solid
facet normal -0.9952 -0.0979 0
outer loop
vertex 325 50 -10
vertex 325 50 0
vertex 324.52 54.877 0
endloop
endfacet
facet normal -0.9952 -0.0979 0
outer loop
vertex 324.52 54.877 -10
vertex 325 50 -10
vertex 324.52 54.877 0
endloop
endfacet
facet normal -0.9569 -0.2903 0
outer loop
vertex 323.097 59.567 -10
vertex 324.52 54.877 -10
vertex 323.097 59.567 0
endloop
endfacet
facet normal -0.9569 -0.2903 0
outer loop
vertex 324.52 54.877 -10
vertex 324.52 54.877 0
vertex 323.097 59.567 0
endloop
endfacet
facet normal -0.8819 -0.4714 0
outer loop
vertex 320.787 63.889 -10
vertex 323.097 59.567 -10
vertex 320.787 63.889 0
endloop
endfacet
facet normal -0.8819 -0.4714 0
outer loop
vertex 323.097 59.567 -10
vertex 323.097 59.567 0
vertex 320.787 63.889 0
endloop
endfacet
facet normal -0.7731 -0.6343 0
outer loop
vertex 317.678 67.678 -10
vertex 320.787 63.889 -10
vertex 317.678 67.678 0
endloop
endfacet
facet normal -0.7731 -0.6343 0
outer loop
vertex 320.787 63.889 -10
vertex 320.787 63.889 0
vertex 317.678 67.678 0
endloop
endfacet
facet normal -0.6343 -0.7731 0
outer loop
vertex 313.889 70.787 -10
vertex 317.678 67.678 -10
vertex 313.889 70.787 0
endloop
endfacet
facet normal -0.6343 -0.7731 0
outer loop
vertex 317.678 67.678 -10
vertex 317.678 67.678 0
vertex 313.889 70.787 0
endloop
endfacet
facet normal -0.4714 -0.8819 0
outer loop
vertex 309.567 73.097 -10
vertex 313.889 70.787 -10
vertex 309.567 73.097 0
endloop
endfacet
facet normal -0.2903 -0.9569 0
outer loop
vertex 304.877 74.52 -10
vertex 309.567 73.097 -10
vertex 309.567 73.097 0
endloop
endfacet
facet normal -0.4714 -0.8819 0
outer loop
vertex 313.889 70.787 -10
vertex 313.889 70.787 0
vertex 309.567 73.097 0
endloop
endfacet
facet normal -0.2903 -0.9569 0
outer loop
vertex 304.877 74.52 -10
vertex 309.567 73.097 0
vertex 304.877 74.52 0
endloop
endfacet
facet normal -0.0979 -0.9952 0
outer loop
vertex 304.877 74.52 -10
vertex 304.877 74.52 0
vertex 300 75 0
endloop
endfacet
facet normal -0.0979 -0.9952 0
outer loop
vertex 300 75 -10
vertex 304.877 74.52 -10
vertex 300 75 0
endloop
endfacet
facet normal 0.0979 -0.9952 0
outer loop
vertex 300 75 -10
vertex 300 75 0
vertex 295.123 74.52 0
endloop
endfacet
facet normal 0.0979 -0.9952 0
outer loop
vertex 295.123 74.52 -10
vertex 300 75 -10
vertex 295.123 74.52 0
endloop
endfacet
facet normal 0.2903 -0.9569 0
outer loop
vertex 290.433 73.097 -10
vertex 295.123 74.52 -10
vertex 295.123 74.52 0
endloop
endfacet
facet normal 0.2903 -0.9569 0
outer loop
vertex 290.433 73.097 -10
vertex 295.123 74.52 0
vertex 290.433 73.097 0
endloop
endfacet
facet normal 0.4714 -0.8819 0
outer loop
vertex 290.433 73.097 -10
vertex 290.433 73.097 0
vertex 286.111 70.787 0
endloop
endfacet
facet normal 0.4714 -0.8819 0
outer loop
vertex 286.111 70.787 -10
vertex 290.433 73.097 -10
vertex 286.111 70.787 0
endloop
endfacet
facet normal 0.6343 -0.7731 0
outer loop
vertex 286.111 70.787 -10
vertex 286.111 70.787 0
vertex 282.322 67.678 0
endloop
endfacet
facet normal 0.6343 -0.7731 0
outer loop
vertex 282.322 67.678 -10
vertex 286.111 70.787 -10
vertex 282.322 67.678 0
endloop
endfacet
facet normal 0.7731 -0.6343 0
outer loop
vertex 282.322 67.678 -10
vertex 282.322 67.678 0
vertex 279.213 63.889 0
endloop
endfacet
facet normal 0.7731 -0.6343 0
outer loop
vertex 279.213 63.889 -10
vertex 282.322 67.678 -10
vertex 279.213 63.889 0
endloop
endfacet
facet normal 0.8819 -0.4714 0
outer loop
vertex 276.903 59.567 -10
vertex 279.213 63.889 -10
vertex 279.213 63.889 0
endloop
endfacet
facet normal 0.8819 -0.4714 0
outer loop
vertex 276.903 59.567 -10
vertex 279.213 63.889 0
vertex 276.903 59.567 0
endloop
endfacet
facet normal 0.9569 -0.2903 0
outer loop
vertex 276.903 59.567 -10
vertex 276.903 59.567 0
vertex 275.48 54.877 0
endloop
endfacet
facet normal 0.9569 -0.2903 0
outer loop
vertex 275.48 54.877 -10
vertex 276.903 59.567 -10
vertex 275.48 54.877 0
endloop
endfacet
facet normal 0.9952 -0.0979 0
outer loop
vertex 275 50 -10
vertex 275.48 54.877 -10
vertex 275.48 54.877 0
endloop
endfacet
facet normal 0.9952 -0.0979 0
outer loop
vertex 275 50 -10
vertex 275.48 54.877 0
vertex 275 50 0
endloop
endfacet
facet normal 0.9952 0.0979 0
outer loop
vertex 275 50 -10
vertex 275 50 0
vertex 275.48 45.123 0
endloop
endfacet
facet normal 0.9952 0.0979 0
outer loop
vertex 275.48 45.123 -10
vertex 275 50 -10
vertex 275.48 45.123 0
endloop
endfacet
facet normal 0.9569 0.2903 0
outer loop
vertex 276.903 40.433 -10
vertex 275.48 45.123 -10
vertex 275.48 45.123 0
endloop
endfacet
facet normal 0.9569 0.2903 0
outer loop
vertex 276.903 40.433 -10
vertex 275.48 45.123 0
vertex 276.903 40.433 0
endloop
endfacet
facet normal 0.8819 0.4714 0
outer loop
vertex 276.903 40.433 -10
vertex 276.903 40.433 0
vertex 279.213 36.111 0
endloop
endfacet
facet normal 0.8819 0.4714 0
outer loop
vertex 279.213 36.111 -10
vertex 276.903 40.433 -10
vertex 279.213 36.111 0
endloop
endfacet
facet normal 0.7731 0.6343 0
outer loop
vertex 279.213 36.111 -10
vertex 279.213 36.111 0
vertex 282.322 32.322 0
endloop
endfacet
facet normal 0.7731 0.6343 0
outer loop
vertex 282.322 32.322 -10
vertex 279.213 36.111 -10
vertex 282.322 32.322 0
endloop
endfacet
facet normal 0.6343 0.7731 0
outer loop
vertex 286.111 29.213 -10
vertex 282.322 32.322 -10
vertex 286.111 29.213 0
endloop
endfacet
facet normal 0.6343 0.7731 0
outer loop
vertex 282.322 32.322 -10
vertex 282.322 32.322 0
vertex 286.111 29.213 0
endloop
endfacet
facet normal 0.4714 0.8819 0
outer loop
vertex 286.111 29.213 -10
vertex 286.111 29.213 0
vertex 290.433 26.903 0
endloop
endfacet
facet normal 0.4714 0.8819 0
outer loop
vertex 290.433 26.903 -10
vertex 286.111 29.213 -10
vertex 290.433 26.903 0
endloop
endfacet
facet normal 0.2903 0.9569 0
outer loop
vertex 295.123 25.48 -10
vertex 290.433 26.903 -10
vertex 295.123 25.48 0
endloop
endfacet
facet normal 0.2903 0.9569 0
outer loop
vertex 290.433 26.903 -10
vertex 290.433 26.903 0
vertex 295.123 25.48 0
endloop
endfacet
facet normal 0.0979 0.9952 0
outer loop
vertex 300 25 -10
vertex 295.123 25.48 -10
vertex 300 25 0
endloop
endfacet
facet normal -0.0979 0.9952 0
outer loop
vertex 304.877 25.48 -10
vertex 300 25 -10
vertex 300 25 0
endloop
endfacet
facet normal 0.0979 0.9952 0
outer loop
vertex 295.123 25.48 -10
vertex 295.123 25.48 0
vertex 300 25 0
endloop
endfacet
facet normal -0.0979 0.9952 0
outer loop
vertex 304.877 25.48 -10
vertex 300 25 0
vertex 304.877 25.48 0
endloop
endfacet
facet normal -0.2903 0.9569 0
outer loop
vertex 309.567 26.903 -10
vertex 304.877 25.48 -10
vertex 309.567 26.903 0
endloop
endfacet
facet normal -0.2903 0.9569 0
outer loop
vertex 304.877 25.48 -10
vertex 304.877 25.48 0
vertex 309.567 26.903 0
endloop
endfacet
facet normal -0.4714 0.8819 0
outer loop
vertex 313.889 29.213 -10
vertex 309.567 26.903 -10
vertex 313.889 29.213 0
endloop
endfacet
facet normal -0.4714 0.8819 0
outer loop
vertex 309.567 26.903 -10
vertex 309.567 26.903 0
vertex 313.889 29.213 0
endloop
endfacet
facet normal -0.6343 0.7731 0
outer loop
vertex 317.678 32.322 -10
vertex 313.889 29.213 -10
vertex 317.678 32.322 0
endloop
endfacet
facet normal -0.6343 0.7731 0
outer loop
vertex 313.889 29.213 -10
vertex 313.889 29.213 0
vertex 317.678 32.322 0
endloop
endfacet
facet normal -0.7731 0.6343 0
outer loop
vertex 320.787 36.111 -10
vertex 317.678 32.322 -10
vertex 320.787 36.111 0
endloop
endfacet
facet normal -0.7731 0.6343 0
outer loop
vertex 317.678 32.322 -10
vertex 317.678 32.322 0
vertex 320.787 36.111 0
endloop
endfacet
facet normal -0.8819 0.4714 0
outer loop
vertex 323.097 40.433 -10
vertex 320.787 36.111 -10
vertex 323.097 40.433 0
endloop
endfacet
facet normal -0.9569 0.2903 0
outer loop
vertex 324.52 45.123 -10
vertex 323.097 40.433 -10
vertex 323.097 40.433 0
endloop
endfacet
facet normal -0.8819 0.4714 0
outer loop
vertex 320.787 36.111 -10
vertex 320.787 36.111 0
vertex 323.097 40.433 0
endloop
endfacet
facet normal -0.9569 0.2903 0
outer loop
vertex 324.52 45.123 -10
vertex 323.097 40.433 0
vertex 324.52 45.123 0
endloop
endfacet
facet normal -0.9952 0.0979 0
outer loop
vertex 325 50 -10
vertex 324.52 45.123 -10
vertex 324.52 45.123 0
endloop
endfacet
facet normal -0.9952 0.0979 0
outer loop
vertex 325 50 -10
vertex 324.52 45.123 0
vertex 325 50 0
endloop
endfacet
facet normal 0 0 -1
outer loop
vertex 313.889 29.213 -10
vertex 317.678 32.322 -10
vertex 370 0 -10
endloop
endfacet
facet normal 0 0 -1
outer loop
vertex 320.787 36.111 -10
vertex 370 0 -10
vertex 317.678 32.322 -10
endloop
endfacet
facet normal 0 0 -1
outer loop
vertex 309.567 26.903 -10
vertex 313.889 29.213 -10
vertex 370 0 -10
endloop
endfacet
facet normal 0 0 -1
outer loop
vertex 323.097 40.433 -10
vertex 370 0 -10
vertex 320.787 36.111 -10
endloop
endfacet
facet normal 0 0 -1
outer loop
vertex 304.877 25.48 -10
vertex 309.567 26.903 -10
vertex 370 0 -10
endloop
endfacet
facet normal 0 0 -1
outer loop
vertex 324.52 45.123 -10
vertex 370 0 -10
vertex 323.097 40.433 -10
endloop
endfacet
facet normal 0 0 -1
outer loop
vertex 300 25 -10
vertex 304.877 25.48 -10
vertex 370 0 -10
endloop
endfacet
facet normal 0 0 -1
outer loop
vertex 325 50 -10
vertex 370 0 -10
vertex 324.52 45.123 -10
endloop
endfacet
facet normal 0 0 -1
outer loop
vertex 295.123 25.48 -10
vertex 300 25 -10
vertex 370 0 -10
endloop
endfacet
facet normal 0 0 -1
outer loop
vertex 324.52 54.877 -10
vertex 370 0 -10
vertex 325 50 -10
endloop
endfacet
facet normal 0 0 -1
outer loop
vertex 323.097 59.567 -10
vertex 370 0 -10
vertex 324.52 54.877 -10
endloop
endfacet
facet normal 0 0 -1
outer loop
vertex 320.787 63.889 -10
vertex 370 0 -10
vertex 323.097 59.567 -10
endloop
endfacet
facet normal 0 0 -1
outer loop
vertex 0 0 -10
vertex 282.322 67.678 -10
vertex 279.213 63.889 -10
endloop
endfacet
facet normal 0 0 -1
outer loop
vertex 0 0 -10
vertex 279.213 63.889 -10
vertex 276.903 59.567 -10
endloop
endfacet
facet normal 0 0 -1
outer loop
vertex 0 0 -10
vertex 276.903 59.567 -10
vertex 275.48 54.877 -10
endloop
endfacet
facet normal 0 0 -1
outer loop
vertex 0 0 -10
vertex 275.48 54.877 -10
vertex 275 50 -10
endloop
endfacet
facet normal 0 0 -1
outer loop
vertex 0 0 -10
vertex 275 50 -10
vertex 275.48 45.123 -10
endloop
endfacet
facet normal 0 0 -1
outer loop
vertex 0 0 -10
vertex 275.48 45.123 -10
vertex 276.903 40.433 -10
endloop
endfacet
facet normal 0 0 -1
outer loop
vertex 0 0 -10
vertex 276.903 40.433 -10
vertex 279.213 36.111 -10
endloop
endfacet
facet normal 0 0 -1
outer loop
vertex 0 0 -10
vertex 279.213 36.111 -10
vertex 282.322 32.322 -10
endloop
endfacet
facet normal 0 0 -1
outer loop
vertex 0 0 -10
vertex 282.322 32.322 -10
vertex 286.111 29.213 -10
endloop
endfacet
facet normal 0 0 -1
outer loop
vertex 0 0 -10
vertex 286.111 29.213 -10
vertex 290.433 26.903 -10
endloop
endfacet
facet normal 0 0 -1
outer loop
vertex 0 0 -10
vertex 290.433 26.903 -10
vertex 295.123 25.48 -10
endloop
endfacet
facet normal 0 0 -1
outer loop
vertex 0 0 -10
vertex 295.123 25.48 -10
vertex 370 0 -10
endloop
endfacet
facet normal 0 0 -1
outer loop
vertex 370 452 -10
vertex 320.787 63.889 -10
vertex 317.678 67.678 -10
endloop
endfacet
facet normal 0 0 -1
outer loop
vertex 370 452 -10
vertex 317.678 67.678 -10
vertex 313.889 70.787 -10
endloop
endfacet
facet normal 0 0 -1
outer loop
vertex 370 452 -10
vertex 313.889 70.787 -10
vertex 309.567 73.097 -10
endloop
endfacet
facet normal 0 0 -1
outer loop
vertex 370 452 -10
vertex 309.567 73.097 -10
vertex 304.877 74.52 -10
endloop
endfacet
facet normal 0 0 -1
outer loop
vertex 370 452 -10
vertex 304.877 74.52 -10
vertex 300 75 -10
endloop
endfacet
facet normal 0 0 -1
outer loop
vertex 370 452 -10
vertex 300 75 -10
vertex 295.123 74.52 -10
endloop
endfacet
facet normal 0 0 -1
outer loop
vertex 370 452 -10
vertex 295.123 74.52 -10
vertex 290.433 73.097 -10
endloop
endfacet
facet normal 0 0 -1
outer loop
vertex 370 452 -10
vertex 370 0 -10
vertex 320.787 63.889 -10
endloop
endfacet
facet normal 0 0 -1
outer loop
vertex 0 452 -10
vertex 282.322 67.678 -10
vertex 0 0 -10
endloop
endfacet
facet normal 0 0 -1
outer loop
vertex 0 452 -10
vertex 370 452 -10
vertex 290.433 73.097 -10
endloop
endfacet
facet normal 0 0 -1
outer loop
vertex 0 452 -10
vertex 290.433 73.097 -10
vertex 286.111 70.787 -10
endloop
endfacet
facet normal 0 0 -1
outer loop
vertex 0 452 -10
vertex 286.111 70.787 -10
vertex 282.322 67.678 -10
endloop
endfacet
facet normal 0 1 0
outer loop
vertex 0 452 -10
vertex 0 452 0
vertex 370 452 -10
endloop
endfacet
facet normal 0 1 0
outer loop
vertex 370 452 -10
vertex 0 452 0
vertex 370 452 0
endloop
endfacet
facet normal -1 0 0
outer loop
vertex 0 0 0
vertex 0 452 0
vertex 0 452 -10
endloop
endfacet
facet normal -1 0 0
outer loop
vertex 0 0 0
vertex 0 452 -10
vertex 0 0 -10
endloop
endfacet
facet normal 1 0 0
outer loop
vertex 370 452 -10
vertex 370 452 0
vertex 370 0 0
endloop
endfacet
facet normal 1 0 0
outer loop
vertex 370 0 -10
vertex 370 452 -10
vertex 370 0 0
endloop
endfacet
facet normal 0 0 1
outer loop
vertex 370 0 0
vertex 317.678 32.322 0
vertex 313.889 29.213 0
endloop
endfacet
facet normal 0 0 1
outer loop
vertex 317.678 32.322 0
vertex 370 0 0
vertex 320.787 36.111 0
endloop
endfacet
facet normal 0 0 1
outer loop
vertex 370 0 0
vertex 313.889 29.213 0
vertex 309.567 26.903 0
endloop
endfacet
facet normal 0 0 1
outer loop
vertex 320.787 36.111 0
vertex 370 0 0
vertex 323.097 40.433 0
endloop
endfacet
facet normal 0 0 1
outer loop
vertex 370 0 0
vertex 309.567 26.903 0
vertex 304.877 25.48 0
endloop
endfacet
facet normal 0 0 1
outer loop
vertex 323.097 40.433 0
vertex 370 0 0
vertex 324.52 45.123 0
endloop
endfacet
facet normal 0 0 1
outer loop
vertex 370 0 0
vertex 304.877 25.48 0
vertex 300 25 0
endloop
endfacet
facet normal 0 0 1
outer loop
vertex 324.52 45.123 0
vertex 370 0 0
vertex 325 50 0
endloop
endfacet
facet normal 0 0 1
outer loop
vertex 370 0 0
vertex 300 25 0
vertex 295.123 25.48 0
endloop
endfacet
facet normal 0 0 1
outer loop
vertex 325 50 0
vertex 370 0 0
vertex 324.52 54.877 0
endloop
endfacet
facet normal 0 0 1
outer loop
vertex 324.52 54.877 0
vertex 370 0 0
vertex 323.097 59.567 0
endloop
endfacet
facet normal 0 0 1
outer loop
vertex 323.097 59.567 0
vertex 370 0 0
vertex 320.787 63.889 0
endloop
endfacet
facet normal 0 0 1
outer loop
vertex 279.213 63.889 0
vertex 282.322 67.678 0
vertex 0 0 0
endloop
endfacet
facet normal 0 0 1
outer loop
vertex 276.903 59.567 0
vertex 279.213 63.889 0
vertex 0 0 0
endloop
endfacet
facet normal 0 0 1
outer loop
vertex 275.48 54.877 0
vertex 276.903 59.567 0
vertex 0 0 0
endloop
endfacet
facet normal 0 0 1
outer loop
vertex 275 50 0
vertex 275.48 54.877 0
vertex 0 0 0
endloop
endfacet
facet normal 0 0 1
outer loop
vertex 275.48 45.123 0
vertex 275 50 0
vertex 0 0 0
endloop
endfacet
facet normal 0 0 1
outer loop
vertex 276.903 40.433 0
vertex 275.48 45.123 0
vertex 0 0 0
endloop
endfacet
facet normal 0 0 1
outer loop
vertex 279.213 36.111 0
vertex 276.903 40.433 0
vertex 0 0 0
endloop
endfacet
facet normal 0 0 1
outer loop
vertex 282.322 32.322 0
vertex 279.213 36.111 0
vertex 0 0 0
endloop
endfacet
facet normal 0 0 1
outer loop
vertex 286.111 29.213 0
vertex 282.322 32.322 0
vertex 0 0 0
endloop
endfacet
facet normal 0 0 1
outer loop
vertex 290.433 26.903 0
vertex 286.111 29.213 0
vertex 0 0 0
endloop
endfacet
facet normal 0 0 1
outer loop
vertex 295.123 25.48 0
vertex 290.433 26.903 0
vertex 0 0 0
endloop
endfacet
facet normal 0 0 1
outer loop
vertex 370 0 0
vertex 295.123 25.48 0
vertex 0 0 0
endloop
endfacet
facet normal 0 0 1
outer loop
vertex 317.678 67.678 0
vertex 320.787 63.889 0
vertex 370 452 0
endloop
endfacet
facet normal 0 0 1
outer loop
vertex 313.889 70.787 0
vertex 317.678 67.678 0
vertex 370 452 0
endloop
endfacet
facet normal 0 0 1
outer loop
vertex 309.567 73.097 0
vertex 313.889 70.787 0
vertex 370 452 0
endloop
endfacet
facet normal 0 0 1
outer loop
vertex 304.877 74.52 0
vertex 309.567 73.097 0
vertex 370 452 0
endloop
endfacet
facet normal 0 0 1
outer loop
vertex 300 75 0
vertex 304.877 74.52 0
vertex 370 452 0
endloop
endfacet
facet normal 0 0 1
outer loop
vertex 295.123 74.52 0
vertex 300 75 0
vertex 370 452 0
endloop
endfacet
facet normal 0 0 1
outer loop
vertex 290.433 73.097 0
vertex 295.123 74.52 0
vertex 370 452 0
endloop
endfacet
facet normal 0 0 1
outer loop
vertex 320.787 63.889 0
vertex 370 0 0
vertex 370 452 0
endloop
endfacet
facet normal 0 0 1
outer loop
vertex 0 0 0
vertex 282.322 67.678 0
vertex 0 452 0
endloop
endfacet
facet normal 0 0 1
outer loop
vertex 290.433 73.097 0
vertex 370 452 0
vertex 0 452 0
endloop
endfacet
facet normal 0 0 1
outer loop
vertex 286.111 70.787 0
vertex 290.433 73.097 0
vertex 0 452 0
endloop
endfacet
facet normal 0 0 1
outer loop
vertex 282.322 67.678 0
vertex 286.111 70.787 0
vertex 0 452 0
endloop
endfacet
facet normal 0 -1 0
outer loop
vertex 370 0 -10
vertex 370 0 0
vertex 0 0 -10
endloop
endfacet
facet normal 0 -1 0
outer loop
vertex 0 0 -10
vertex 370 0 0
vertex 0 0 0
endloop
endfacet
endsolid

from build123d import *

# Parameters (mm, degrees)
PAD_DEPTH    = 10
SKETCH002_R  = 25
POCKET_DEPTH = 10.001


with BuildPart() as part:
    # Sketch → Pad (new body)
    with BuildSketch(Plane.XY):
        Polygon((0, 413.879036), (0, 452), (370, 452), (370, 0), (0, 0), align=None)
    extrude(amount=-PAD_DEPTH)

    # Sketch002 (on Face6 of Pad) → Pocket (cut, through all)
    with BuildSketch(Plane.XY):
        with Locations((300, 50)):
            Circle(SKETCH002_R)
    extrude(amount=-POCKET_DEPTH, mode=Mode.SUBTRACT)


solid = part.part
